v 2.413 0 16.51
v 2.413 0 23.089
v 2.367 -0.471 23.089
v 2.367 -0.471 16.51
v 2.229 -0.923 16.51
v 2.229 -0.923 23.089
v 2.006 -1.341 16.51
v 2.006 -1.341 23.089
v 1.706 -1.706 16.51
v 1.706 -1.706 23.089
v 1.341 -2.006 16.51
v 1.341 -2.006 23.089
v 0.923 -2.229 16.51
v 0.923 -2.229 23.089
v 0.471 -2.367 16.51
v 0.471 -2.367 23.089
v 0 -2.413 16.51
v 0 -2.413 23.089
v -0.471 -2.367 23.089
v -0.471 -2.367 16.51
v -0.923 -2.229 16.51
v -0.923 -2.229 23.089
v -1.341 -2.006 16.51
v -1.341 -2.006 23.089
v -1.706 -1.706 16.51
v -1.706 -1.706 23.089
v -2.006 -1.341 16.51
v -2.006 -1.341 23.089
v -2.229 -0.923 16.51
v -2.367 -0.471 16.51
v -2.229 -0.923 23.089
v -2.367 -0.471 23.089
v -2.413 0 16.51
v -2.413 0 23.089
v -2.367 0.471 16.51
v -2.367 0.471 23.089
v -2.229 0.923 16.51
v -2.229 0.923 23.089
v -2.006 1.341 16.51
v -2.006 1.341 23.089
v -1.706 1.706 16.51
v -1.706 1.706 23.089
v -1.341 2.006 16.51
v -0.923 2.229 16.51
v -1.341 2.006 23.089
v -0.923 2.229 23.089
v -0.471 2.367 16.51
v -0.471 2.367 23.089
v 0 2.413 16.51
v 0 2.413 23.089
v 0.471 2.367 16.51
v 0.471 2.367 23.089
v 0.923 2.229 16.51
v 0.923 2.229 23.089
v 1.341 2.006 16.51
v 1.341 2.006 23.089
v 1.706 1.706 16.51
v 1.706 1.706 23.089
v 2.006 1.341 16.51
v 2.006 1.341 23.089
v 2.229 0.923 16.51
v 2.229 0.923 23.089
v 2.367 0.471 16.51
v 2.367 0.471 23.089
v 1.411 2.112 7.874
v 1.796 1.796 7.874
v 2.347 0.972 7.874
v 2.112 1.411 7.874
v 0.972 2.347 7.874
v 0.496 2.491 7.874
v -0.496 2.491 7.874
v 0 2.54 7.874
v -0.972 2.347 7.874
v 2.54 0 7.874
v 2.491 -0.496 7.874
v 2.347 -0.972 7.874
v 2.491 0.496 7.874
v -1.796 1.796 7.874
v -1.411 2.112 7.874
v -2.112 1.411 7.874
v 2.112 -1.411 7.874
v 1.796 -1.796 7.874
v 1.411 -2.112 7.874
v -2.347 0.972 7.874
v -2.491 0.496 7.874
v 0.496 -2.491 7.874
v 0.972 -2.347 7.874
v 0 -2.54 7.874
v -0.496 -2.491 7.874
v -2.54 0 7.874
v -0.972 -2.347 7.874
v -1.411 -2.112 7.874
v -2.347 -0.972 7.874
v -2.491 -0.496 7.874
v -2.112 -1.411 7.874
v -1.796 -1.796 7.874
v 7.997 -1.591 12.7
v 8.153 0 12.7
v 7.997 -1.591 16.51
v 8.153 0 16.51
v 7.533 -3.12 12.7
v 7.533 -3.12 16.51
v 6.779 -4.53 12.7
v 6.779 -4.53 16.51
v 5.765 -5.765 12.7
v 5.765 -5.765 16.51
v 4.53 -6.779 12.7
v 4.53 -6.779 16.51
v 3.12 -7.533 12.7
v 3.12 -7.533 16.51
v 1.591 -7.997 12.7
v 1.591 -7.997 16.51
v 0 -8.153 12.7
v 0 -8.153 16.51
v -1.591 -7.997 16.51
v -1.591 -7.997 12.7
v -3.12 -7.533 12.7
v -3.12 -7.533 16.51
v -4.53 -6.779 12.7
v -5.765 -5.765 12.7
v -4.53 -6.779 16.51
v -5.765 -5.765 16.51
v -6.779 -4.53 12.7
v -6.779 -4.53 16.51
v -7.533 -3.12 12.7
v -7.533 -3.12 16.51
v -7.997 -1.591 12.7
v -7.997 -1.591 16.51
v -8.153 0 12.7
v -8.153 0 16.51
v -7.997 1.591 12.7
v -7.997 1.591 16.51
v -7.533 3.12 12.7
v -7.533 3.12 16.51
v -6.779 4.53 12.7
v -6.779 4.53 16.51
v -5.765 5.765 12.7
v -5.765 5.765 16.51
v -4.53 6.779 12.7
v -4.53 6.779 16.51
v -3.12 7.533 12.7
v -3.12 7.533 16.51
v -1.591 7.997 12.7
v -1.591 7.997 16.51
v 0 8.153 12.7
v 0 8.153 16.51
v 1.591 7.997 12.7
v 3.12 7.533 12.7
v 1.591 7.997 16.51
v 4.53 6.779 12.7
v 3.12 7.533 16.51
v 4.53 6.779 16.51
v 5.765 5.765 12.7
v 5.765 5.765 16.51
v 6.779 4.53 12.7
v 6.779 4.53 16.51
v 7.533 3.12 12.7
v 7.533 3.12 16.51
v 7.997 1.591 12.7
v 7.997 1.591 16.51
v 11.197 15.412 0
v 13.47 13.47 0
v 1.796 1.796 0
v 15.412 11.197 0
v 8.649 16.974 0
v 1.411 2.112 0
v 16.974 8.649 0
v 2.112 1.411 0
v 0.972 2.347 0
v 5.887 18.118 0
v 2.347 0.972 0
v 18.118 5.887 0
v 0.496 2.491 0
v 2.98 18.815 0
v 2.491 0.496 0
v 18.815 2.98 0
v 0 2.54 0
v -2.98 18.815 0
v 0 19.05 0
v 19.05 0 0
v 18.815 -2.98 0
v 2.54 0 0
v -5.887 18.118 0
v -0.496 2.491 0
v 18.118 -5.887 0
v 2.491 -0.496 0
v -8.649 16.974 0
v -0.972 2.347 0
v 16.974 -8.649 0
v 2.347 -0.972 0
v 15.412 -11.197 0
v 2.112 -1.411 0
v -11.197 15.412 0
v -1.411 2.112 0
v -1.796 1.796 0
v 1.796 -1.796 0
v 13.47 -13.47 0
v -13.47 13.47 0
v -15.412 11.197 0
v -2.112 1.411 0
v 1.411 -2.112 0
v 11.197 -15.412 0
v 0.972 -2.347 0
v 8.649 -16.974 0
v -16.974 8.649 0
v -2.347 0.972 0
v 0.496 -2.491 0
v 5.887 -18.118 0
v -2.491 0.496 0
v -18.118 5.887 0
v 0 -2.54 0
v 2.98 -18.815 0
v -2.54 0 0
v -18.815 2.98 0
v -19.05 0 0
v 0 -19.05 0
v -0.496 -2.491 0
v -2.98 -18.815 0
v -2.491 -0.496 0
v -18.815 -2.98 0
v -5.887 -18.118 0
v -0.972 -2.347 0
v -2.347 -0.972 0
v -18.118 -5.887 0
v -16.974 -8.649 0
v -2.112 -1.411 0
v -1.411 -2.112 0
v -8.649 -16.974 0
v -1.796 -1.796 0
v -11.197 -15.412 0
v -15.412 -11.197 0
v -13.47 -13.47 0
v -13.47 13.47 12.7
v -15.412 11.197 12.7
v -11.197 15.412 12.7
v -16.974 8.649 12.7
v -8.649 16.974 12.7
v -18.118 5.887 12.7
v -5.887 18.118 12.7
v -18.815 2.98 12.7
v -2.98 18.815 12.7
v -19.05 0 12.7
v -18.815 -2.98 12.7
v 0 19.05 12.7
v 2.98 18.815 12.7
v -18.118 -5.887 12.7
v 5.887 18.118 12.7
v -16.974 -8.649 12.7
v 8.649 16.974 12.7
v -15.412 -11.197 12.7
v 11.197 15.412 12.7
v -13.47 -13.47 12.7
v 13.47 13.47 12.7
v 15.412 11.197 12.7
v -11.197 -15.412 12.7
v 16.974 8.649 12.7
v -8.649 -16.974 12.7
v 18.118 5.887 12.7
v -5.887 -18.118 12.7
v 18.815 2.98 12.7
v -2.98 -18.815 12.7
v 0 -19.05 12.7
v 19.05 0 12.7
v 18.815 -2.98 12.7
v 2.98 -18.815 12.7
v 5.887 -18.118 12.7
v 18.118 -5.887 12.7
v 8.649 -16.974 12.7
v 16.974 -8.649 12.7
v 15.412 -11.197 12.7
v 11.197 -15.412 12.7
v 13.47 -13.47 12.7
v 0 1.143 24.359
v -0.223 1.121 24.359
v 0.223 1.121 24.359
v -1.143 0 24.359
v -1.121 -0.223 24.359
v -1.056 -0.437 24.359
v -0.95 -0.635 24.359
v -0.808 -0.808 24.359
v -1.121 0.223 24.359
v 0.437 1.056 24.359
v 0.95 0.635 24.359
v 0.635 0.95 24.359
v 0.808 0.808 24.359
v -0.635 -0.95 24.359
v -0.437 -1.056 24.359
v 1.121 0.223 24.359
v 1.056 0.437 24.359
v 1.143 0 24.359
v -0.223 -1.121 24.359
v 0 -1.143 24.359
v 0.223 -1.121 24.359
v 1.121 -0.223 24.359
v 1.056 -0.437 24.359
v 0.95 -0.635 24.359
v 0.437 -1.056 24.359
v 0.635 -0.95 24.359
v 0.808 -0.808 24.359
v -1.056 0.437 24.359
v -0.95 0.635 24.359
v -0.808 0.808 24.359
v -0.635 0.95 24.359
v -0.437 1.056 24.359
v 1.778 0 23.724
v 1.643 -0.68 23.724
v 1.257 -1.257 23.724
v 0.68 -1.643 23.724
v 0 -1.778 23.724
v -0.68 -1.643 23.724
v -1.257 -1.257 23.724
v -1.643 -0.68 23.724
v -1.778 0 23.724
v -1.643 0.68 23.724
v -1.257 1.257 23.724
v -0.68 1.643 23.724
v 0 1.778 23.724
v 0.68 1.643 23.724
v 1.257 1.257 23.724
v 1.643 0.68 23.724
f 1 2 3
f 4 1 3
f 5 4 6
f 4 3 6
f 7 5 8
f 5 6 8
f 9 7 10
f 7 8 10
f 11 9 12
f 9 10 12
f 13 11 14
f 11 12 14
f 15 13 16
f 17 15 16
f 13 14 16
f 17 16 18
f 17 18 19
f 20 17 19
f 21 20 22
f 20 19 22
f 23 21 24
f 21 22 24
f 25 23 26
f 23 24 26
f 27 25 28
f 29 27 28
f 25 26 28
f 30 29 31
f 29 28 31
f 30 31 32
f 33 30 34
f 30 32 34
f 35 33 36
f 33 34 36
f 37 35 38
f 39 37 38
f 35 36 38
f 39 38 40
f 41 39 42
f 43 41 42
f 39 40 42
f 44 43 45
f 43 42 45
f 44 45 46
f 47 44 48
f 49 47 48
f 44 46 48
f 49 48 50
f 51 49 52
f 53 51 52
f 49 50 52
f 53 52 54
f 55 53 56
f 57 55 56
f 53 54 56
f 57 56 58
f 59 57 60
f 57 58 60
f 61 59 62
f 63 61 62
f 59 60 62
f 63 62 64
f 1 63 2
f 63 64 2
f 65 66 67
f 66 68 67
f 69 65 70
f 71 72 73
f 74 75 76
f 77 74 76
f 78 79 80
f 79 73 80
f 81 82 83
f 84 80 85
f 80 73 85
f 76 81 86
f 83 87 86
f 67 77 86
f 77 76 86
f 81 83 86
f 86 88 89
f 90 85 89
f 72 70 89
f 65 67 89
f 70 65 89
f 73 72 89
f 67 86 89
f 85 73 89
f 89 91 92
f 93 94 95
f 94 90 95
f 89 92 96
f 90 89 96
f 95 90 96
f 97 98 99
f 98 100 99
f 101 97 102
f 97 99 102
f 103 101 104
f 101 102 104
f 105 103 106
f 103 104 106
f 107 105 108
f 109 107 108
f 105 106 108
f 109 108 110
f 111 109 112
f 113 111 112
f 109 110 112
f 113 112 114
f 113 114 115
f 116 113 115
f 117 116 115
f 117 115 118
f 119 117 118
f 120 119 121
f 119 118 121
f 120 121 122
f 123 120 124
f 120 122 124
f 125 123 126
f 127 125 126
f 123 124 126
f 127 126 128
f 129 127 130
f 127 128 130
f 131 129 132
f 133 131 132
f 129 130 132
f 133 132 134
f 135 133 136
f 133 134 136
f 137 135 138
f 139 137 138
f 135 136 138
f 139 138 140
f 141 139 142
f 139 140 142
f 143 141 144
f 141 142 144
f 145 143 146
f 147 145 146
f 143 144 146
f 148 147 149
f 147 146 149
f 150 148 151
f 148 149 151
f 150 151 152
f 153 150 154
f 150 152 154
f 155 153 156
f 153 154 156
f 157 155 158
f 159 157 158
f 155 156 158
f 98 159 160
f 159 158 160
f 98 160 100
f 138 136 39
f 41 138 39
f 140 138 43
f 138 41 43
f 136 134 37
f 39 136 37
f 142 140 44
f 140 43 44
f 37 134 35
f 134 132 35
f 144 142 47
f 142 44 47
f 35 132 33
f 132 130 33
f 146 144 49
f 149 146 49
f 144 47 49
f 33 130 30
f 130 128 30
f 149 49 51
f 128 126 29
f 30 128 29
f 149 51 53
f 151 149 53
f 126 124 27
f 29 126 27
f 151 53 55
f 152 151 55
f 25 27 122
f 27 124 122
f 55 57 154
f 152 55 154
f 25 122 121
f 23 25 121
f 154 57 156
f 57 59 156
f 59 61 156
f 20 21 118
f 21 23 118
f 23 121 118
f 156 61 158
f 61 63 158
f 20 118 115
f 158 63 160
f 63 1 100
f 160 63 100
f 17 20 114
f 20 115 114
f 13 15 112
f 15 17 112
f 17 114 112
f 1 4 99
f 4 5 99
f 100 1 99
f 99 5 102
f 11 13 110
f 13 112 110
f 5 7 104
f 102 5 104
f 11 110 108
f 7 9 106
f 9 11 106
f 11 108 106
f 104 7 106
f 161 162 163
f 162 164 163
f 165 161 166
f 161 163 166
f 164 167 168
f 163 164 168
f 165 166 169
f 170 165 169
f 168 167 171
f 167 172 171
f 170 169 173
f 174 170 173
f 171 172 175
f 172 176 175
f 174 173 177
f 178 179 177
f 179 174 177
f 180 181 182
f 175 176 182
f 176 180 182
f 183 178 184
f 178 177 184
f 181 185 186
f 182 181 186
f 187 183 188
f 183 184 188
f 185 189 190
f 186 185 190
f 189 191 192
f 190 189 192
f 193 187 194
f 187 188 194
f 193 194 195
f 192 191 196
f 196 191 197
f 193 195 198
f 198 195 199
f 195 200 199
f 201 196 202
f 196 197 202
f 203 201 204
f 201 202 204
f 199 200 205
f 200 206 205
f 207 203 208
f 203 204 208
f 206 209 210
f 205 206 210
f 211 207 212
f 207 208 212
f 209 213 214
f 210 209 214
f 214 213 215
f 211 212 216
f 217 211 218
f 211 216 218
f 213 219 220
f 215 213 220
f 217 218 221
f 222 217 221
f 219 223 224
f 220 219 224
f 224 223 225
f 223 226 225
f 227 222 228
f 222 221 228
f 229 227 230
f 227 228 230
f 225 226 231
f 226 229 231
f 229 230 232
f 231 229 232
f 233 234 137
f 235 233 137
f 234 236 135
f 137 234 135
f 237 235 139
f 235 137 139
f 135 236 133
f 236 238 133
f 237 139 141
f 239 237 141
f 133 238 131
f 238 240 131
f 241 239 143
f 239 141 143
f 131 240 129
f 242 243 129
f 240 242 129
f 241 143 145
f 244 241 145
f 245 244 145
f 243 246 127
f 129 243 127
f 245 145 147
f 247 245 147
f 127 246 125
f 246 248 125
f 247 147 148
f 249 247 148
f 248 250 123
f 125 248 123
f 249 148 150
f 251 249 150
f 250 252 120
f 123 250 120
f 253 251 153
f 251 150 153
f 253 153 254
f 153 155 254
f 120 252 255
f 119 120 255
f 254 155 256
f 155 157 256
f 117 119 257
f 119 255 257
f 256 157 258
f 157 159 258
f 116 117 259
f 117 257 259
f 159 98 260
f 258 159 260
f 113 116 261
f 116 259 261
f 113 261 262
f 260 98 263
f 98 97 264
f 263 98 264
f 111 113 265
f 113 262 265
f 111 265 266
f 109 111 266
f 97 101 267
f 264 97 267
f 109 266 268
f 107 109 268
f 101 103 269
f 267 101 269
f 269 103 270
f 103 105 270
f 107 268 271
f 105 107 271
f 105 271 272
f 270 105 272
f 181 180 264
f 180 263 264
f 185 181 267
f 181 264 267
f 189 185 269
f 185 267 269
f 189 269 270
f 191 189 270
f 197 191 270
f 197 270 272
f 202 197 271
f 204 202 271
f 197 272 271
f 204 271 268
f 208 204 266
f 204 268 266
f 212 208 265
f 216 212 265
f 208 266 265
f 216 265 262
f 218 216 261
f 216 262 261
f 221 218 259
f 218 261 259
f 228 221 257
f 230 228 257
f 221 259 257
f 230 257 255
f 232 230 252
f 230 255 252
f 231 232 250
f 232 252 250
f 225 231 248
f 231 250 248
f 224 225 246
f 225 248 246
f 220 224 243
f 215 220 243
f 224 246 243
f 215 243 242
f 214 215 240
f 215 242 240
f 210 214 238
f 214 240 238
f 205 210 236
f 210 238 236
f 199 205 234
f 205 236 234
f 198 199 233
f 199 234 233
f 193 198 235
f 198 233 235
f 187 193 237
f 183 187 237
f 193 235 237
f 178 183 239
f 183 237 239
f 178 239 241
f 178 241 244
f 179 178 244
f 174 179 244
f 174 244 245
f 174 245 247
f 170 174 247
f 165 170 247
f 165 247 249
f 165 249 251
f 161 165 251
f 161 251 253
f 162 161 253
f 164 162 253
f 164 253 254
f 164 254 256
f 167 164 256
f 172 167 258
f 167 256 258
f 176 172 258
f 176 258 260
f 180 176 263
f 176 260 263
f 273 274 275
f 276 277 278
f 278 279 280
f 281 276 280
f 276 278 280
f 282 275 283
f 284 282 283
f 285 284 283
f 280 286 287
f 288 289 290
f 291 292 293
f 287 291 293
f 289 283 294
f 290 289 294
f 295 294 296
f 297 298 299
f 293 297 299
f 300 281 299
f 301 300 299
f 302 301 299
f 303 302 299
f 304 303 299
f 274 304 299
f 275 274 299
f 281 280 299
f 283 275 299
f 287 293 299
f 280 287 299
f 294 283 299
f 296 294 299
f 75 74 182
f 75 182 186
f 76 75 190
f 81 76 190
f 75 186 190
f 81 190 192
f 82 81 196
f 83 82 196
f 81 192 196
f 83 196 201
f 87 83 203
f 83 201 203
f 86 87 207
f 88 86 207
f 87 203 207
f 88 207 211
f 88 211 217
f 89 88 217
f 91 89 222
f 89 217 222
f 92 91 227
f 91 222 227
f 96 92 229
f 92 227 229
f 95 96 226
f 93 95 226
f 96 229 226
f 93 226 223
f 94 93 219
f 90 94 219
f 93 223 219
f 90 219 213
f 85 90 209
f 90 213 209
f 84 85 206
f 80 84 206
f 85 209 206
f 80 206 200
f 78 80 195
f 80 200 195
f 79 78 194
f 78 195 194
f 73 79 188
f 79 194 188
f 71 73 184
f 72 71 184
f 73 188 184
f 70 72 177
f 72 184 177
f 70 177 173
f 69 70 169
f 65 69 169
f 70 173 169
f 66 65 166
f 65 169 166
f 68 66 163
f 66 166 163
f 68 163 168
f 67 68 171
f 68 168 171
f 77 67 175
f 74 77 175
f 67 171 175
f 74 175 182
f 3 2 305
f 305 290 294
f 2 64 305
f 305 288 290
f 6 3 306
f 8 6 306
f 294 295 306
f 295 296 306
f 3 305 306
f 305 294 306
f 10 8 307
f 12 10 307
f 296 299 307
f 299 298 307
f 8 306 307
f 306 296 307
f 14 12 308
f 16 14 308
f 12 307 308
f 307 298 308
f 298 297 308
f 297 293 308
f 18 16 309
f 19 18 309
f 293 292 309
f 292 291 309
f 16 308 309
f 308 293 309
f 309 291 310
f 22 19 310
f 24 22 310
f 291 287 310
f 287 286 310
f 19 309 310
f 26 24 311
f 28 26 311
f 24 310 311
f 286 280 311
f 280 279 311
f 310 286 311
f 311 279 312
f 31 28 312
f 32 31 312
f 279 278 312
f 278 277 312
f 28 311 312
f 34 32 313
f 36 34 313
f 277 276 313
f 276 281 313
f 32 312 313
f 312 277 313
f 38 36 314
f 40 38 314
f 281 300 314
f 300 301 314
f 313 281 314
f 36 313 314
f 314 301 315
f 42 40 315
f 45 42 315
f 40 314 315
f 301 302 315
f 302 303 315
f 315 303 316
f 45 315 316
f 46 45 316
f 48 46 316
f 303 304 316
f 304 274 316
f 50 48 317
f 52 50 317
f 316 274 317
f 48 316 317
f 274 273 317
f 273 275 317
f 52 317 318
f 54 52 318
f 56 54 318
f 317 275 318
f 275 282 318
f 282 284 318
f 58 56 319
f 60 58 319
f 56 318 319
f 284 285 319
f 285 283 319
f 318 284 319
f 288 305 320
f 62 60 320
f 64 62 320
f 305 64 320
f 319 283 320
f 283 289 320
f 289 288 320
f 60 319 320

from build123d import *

# Parameters (mm, degrees)
F2_SIZE = 1.27


with BuildPart() as f1:
    # F0 (on Front) → F1 (revolve)
    with BuildSketch(Plane.XZ):
        Polygon((2.54, 0), (19.05, 0), (19.05, 12.7), (8.1534, 12.7), (8.1534, 16.51), (2.413, 16.51), (2.413, 24.3586), (0, 24.3586), (0, 16.51), (0, 7.874), (2.54, 7.874), align=None)
    revolve(axis=Axis((0, 0, 12.192), (0, 0, -1)))

    # F2
    f2_edges = [f1.edges().sort_by_distance(p)[0] for p in [
        (-2.413, 0, 24.3586),
    ]]
    chamfer(f2_edges, length=F2_SIZE)


solid = f1.part
